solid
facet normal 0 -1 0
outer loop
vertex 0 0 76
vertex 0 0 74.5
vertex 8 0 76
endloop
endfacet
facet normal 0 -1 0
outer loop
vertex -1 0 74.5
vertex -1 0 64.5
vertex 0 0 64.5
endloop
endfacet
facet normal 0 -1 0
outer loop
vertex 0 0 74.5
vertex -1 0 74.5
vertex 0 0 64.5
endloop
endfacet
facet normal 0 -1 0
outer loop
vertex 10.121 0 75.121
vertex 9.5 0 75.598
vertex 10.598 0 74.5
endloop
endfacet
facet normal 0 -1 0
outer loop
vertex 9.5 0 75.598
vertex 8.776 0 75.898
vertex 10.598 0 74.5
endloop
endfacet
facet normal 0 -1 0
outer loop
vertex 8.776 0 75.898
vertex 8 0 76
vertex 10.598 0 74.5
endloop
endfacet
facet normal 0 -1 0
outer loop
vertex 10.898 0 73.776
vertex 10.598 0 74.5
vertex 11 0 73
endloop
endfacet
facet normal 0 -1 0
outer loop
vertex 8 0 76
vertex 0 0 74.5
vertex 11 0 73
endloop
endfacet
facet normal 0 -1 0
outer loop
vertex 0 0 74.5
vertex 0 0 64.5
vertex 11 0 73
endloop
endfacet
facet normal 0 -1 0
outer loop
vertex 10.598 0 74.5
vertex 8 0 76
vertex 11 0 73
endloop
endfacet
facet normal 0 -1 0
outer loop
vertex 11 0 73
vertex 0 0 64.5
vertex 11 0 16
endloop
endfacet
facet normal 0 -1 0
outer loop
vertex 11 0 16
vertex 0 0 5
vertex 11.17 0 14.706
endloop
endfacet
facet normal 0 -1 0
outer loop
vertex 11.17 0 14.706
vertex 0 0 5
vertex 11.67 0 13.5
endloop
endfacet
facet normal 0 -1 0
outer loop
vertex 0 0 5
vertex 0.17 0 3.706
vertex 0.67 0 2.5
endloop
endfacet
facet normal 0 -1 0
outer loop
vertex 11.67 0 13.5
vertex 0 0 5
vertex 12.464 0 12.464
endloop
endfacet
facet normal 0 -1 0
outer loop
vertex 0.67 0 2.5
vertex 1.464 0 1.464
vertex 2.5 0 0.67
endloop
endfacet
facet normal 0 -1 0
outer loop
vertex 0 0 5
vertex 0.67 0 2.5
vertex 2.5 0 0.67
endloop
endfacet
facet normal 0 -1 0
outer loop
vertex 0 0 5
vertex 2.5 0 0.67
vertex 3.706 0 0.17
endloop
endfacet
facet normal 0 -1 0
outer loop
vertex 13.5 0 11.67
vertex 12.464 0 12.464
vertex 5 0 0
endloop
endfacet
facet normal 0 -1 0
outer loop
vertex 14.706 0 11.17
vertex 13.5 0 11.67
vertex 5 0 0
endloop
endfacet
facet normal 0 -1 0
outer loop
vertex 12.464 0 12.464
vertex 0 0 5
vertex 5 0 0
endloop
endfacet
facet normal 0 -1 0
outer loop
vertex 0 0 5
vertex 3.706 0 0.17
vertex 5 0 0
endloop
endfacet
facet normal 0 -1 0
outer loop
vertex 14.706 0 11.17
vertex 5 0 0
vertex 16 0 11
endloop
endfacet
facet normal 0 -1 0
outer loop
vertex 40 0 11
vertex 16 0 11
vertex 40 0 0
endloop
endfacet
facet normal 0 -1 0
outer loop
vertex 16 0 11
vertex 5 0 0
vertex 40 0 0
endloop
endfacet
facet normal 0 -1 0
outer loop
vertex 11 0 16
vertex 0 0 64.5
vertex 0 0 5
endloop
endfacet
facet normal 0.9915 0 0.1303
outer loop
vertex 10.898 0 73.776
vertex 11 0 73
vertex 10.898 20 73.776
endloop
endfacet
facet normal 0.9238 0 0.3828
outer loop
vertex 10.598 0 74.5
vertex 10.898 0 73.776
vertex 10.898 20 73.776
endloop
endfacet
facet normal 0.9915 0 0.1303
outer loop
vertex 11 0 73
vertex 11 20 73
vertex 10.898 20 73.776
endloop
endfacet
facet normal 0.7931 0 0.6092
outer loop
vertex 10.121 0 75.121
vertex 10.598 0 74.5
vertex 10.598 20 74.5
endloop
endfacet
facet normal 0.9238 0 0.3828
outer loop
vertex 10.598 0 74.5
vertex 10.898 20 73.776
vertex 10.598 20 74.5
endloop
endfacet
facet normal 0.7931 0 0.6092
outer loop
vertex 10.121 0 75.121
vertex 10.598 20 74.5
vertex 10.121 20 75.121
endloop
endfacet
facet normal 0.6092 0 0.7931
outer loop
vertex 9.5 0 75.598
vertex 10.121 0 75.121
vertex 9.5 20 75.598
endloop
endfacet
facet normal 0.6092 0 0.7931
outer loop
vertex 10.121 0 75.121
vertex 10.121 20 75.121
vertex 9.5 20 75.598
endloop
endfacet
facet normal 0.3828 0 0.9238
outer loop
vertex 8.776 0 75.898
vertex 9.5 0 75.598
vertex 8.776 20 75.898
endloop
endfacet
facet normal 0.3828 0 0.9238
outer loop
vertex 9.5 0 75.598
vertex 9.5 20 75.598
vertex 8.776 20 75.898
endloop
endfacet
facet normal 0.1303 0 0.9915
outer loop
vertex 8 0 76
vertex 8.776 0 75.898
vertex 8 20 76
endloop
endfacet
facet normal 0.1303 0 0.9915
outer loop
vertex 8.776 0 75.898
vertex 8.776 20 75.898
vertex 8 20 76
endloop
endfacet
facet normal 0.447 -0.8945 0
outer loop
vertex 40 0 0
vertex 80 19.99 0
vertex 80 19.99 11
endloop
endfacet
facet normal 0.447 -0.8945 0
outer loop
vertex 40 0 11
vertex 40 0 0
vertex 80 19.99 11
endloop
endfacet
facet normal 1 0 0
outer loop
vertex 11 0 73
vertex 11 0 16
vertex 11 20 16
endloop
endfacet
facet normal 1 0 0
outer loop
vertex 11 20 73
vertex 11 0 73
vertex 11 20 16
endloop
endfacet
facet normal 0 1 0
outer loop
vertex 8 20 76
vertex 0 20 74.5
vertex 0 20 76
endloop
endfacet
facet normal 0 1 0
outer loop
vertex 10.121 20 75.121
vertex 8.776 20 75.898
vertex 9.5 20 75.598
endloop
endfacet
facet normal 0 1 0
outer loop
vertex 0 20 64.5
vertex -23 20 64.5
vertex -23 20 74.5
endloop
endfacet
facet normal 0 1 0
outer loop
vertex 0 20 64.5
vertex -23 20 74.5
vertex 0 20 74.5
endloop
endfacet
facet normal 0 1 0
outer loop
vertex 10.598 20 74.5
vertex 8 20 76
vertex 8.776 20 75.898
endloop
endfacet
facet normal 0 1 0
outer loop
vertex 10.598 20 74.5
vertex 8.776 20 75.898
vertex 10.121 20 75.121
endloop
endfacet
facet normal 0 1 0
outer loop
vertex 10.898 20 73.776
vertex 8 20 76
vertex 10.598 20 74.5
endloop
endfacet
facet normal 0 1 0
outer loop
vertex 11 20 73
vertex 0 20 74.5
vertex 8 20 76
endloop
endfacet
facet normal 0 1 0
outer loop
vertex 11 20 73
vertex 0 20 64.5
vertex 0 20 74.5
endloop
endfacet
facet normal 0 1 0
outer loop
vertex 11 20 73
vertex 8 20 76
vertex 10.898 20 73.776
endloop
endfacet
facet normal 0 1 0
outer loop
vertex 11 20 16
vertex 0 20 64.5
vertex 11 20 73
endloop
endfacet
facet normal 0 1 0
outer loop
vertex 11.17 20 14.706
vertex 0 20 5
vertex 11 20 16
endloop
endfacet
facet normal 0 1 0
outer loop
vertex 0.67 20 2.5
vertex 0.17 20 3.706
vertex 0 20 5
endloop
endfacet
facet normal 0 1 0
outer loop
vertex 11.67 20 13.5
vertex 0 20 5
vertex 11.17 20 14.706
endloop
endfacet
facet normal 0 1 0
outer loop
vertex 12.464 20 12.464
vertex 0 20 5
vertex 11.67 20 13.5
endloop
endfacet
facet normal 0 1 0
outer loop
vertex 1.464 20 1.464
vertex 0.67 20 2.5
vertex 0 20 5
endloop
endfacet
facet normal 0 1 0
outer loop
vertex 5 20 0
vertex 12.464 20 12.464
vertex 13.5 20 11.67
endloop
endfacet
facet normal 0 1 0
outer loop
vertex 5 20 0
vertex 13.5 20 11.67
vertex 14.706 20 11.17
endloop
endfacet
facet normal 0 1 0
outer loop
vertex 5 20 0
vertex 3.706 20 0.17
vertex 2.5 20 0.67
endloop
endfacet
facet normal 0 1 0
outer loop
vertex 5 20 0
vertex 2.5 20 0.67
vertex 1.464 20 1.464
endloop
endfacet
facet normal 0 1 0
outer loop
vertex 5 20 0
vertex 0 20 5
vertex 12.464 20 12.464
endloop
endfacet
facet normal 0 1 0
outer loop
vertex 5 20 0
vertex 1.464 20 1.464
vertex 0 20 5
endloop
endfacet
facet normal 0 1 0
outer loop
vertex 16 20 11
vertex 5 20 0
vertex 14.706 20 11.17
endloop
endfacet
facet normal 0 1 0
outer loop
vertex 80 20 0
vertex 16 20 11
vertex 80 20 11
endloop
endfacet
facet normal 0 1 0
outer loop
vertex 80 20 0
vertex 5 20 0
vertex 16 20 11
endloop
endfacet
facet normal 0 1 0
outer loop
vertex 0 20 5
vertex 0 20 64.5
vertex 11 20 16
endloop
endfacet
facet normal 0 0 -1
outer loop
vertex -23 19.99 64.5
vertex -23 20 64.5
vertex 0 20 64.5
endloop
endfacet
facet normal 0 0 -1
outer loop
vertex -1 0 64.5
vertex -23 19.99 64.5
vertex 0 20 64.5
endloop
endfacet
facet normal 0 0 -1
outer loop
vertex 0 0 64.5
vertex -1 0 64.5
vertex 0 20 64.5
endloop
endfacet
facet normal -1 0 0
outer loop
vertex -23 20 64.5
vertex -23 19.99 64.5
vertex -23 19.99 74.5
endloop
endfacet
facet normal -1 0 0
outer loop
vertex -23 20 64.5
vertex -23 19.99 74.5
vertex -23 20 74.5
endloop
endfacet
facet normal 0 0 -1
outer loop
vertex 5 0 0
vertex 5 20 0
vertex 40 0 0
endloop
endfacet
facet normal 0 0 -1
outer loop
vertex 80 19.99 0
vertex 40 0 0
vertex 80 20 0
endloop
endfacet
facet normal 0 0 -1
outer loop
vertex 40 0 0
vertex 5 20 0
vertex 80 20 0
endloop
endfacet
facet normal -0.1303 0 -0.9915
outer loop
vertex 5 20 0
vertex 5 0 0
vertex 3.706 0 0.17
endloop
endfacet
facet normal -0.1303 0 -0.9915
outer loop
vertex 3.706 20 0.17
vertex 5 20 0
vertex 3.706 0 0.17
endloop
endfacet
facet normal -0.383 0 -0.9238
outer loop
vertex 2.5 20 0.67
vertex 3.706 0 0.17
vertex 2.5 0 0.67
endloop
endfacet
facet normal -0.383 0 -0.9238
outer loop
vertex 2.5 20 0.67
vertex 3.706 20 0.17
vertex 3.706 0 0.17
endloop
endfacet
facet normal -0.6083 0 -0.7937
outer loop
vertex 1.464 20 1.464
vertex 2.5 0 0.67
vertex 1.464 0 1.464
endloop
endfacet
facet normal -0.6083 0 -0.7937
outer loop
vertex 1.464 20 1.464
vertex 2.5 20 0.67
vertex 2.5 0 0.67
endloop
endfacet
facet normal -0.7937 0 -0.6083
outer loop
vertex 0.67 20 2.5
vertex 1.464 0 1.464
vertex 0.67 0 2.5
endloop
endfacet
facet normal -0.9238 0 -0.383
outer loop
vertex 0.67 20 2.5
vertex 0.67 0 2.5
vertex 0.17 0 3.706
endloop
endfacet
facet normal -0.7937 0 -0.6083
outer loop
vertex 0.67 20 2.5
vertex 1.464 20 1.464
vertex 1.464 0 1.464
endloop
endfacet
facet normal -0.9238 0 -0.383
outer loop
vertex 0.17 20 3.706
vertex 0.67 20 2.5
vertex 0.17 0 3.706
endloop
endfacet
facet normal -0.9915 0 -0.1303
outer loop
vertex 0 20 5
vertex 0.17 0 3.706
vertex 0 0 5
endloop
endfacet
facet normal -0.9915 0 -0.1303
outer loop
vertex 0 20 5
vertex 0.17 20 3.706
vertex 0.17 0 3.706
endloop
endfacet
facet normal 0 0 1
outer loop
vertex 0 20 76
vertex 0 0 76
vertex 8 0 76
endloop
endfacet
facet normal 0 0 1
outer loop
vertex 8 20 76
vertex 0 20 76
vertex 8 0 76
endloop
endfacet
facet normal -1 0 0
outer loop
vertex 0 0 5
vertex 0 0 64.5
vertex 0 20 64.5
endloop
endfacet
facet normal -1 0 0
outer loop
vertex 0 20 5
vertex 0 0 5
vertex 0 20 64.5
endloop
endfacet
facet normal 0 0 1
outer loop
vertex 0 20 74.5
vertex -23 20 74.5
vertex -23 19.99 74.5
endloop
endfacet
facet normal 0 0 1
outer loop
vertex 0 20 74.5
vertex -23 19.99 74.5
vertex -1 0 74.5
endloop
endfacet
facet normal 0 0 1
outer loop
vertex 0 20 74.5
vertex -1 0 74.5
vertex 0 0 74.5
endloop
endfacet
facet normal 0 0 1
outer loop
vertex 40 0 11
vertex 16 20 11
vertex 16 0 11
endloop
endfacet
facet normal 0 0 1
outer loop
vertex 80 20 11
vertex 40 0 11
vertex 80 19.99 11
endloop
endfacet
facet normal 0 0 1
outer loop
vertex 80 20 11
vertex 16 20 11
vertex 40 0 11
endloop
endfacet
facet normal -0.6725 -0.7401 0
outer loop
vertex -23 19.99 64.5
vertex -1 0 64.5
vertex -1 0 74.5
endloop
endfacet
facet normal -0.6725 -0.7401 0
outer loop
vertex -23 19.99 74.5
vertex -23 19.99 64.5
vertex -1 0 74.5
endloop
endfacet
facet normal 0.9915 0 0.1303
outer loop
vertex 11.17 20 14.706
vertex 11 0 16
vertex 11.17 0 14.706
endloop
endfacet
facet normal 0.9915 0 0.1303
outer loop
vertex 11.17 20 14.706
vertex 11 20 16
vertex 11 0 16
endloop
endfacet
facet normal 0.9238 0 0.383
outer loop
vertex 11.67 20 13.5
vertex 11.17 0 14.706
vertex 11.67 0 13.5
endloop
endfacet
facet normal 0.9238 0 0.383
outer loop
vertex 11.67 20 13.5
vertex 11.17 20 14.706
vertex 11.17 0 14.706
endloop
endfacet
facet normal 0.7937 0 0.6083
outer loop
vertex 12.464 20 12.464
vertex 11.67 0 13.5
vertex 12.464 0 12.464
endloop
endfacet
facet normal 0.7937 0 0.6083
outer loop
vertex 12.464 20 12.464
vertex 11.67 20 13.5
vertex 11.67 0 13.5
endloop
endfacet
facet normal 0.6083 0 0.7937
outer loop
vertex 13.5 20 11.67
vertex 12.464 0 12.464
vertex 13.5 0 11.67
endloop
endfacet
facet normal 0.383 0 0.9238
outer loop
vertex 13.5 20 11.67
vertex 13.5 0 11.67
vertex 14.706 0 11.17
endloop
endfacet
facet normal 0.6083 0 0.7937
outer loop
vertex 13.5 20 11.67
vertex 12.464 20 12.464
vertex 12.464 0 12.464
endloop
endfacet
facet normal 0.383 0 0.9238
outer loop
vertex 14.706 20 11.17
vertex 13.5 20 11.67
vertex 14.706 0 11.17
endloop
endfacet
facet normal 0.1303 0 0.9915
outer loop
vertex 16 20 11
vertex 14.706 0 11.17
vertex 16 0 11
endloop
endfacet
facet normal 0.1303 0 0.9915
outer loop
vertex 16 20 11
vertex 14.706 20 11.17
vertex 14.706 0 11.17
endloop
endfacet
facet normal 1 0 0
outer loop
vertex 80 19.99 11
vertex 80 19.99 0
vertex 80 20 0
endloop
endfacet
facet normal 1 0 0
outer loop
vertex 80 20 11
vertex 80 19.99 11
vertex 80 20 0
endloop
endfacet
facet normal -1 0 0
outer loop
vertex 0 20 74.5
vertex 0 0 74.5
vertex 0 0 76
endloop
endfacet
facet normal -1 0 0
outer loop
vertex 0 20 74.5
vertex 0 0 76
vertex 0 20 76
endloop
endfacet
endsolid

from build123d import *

# Parameters (mm, degrees)
BOX088_W                = 80
BOX088_H                = 20
BOX088_DEPTH            = 11
BOX089_W                = 34
BOX089_H                = 20
BOX089_DEPTH            = 10
BOX087_W                = 11
BOX087_H                = 20
BOX087_DEPTH            = 76
FILLET001006007031013_R = 5
FILLET001006007031014_R = 3
CHAMFER_SIZE2           = 22
CHAMFER_SIZE            = 19.99
CHAMFER011006013_SIZE2  = 19.99
CHAMFER011006013_SIZE   = 40


with BuildPart() as cube:
    # Box088 → Box088 (new body)
    with BuildSketch(Plane.XY):
        with Locations((40, 10)):
            Rectangle(BOX088_W, BOX088_H)
    extrude(amount=BOX088_DEPTH)


with BuildPart() as box089:
    # Box089 → Box089 (new body)
    with BuildSketch(Plane(origin=(-23, 0, 64.5), x_dir=(1, 0, 0), z_dir=(0, 0, 1))):
        with Locations((17, 10)):
            Rectangle(BOX089_W, BOX089_H)
    extrude(amount=BOX089_DEPTH)


with BuildPart() as chamfer011006013:
    # Box087 → Box087 (new body)
    with BuildSketch(Plane.XY):
        with Locations((5.5, 10)):
            Rectangle(BOX087_W, BOX087_H)
    extrude(amount=BOX087_DEPTH)

    # Fusion: union Cube, Box089
    add(cube.part)
    add(box089.part)

    # Fillet001006007031013
    fillet001006007031013_edges = [chamfer011006013.edges().sort_by_distance(p)[0] for p in [
        (11, 10, 11),
        (0, 10, 0),
    ]]
    fillet(fillet001006007031013_edges, radius=FILLET001006007031013_R)

    # Fillet001006007031014
    fillet001006007031014_edges = [chamfer011006013.edges().sort_by_distance(p)[0] for p in [
        (11, 10, 76),
    ]]
    fillet(fillet001006007031014_edges, radius=FILLET001006007031014_R)

    # Chamfer
    chamfer_edges = [chamfer011006013.edges().sort_by_distance(p)[0] for p in [
        (-23, 0, 69.5),
    ]]
    chamfer_side = chamfer011006013.faces().sort_by_distance((-23, 10, 69.5))[0]
    chamfer(chamfer_edges, length=CHAMFER_SIZE, length2=CHAMFER_SIZE2, reference=chamfer_side)

    # Chamfer011006013
    chamfer011006013_edges = [chamfer011006013.edges().sort_by_distance(p)[0] for p in [
        (80, 0, 5.5),
    ]]
    chamfer011006013_side = chamfer011006013.faces().sort_by_distance((-0.5, 0, 73.38928))[0]
    chamfer(chamfer011006013_edges, length=CHAMFER011006013_SIZE, length2=CHAMFER011006013_SIZE2, reference=chamfer011006013_side)


solid = chamfer011006013.part
